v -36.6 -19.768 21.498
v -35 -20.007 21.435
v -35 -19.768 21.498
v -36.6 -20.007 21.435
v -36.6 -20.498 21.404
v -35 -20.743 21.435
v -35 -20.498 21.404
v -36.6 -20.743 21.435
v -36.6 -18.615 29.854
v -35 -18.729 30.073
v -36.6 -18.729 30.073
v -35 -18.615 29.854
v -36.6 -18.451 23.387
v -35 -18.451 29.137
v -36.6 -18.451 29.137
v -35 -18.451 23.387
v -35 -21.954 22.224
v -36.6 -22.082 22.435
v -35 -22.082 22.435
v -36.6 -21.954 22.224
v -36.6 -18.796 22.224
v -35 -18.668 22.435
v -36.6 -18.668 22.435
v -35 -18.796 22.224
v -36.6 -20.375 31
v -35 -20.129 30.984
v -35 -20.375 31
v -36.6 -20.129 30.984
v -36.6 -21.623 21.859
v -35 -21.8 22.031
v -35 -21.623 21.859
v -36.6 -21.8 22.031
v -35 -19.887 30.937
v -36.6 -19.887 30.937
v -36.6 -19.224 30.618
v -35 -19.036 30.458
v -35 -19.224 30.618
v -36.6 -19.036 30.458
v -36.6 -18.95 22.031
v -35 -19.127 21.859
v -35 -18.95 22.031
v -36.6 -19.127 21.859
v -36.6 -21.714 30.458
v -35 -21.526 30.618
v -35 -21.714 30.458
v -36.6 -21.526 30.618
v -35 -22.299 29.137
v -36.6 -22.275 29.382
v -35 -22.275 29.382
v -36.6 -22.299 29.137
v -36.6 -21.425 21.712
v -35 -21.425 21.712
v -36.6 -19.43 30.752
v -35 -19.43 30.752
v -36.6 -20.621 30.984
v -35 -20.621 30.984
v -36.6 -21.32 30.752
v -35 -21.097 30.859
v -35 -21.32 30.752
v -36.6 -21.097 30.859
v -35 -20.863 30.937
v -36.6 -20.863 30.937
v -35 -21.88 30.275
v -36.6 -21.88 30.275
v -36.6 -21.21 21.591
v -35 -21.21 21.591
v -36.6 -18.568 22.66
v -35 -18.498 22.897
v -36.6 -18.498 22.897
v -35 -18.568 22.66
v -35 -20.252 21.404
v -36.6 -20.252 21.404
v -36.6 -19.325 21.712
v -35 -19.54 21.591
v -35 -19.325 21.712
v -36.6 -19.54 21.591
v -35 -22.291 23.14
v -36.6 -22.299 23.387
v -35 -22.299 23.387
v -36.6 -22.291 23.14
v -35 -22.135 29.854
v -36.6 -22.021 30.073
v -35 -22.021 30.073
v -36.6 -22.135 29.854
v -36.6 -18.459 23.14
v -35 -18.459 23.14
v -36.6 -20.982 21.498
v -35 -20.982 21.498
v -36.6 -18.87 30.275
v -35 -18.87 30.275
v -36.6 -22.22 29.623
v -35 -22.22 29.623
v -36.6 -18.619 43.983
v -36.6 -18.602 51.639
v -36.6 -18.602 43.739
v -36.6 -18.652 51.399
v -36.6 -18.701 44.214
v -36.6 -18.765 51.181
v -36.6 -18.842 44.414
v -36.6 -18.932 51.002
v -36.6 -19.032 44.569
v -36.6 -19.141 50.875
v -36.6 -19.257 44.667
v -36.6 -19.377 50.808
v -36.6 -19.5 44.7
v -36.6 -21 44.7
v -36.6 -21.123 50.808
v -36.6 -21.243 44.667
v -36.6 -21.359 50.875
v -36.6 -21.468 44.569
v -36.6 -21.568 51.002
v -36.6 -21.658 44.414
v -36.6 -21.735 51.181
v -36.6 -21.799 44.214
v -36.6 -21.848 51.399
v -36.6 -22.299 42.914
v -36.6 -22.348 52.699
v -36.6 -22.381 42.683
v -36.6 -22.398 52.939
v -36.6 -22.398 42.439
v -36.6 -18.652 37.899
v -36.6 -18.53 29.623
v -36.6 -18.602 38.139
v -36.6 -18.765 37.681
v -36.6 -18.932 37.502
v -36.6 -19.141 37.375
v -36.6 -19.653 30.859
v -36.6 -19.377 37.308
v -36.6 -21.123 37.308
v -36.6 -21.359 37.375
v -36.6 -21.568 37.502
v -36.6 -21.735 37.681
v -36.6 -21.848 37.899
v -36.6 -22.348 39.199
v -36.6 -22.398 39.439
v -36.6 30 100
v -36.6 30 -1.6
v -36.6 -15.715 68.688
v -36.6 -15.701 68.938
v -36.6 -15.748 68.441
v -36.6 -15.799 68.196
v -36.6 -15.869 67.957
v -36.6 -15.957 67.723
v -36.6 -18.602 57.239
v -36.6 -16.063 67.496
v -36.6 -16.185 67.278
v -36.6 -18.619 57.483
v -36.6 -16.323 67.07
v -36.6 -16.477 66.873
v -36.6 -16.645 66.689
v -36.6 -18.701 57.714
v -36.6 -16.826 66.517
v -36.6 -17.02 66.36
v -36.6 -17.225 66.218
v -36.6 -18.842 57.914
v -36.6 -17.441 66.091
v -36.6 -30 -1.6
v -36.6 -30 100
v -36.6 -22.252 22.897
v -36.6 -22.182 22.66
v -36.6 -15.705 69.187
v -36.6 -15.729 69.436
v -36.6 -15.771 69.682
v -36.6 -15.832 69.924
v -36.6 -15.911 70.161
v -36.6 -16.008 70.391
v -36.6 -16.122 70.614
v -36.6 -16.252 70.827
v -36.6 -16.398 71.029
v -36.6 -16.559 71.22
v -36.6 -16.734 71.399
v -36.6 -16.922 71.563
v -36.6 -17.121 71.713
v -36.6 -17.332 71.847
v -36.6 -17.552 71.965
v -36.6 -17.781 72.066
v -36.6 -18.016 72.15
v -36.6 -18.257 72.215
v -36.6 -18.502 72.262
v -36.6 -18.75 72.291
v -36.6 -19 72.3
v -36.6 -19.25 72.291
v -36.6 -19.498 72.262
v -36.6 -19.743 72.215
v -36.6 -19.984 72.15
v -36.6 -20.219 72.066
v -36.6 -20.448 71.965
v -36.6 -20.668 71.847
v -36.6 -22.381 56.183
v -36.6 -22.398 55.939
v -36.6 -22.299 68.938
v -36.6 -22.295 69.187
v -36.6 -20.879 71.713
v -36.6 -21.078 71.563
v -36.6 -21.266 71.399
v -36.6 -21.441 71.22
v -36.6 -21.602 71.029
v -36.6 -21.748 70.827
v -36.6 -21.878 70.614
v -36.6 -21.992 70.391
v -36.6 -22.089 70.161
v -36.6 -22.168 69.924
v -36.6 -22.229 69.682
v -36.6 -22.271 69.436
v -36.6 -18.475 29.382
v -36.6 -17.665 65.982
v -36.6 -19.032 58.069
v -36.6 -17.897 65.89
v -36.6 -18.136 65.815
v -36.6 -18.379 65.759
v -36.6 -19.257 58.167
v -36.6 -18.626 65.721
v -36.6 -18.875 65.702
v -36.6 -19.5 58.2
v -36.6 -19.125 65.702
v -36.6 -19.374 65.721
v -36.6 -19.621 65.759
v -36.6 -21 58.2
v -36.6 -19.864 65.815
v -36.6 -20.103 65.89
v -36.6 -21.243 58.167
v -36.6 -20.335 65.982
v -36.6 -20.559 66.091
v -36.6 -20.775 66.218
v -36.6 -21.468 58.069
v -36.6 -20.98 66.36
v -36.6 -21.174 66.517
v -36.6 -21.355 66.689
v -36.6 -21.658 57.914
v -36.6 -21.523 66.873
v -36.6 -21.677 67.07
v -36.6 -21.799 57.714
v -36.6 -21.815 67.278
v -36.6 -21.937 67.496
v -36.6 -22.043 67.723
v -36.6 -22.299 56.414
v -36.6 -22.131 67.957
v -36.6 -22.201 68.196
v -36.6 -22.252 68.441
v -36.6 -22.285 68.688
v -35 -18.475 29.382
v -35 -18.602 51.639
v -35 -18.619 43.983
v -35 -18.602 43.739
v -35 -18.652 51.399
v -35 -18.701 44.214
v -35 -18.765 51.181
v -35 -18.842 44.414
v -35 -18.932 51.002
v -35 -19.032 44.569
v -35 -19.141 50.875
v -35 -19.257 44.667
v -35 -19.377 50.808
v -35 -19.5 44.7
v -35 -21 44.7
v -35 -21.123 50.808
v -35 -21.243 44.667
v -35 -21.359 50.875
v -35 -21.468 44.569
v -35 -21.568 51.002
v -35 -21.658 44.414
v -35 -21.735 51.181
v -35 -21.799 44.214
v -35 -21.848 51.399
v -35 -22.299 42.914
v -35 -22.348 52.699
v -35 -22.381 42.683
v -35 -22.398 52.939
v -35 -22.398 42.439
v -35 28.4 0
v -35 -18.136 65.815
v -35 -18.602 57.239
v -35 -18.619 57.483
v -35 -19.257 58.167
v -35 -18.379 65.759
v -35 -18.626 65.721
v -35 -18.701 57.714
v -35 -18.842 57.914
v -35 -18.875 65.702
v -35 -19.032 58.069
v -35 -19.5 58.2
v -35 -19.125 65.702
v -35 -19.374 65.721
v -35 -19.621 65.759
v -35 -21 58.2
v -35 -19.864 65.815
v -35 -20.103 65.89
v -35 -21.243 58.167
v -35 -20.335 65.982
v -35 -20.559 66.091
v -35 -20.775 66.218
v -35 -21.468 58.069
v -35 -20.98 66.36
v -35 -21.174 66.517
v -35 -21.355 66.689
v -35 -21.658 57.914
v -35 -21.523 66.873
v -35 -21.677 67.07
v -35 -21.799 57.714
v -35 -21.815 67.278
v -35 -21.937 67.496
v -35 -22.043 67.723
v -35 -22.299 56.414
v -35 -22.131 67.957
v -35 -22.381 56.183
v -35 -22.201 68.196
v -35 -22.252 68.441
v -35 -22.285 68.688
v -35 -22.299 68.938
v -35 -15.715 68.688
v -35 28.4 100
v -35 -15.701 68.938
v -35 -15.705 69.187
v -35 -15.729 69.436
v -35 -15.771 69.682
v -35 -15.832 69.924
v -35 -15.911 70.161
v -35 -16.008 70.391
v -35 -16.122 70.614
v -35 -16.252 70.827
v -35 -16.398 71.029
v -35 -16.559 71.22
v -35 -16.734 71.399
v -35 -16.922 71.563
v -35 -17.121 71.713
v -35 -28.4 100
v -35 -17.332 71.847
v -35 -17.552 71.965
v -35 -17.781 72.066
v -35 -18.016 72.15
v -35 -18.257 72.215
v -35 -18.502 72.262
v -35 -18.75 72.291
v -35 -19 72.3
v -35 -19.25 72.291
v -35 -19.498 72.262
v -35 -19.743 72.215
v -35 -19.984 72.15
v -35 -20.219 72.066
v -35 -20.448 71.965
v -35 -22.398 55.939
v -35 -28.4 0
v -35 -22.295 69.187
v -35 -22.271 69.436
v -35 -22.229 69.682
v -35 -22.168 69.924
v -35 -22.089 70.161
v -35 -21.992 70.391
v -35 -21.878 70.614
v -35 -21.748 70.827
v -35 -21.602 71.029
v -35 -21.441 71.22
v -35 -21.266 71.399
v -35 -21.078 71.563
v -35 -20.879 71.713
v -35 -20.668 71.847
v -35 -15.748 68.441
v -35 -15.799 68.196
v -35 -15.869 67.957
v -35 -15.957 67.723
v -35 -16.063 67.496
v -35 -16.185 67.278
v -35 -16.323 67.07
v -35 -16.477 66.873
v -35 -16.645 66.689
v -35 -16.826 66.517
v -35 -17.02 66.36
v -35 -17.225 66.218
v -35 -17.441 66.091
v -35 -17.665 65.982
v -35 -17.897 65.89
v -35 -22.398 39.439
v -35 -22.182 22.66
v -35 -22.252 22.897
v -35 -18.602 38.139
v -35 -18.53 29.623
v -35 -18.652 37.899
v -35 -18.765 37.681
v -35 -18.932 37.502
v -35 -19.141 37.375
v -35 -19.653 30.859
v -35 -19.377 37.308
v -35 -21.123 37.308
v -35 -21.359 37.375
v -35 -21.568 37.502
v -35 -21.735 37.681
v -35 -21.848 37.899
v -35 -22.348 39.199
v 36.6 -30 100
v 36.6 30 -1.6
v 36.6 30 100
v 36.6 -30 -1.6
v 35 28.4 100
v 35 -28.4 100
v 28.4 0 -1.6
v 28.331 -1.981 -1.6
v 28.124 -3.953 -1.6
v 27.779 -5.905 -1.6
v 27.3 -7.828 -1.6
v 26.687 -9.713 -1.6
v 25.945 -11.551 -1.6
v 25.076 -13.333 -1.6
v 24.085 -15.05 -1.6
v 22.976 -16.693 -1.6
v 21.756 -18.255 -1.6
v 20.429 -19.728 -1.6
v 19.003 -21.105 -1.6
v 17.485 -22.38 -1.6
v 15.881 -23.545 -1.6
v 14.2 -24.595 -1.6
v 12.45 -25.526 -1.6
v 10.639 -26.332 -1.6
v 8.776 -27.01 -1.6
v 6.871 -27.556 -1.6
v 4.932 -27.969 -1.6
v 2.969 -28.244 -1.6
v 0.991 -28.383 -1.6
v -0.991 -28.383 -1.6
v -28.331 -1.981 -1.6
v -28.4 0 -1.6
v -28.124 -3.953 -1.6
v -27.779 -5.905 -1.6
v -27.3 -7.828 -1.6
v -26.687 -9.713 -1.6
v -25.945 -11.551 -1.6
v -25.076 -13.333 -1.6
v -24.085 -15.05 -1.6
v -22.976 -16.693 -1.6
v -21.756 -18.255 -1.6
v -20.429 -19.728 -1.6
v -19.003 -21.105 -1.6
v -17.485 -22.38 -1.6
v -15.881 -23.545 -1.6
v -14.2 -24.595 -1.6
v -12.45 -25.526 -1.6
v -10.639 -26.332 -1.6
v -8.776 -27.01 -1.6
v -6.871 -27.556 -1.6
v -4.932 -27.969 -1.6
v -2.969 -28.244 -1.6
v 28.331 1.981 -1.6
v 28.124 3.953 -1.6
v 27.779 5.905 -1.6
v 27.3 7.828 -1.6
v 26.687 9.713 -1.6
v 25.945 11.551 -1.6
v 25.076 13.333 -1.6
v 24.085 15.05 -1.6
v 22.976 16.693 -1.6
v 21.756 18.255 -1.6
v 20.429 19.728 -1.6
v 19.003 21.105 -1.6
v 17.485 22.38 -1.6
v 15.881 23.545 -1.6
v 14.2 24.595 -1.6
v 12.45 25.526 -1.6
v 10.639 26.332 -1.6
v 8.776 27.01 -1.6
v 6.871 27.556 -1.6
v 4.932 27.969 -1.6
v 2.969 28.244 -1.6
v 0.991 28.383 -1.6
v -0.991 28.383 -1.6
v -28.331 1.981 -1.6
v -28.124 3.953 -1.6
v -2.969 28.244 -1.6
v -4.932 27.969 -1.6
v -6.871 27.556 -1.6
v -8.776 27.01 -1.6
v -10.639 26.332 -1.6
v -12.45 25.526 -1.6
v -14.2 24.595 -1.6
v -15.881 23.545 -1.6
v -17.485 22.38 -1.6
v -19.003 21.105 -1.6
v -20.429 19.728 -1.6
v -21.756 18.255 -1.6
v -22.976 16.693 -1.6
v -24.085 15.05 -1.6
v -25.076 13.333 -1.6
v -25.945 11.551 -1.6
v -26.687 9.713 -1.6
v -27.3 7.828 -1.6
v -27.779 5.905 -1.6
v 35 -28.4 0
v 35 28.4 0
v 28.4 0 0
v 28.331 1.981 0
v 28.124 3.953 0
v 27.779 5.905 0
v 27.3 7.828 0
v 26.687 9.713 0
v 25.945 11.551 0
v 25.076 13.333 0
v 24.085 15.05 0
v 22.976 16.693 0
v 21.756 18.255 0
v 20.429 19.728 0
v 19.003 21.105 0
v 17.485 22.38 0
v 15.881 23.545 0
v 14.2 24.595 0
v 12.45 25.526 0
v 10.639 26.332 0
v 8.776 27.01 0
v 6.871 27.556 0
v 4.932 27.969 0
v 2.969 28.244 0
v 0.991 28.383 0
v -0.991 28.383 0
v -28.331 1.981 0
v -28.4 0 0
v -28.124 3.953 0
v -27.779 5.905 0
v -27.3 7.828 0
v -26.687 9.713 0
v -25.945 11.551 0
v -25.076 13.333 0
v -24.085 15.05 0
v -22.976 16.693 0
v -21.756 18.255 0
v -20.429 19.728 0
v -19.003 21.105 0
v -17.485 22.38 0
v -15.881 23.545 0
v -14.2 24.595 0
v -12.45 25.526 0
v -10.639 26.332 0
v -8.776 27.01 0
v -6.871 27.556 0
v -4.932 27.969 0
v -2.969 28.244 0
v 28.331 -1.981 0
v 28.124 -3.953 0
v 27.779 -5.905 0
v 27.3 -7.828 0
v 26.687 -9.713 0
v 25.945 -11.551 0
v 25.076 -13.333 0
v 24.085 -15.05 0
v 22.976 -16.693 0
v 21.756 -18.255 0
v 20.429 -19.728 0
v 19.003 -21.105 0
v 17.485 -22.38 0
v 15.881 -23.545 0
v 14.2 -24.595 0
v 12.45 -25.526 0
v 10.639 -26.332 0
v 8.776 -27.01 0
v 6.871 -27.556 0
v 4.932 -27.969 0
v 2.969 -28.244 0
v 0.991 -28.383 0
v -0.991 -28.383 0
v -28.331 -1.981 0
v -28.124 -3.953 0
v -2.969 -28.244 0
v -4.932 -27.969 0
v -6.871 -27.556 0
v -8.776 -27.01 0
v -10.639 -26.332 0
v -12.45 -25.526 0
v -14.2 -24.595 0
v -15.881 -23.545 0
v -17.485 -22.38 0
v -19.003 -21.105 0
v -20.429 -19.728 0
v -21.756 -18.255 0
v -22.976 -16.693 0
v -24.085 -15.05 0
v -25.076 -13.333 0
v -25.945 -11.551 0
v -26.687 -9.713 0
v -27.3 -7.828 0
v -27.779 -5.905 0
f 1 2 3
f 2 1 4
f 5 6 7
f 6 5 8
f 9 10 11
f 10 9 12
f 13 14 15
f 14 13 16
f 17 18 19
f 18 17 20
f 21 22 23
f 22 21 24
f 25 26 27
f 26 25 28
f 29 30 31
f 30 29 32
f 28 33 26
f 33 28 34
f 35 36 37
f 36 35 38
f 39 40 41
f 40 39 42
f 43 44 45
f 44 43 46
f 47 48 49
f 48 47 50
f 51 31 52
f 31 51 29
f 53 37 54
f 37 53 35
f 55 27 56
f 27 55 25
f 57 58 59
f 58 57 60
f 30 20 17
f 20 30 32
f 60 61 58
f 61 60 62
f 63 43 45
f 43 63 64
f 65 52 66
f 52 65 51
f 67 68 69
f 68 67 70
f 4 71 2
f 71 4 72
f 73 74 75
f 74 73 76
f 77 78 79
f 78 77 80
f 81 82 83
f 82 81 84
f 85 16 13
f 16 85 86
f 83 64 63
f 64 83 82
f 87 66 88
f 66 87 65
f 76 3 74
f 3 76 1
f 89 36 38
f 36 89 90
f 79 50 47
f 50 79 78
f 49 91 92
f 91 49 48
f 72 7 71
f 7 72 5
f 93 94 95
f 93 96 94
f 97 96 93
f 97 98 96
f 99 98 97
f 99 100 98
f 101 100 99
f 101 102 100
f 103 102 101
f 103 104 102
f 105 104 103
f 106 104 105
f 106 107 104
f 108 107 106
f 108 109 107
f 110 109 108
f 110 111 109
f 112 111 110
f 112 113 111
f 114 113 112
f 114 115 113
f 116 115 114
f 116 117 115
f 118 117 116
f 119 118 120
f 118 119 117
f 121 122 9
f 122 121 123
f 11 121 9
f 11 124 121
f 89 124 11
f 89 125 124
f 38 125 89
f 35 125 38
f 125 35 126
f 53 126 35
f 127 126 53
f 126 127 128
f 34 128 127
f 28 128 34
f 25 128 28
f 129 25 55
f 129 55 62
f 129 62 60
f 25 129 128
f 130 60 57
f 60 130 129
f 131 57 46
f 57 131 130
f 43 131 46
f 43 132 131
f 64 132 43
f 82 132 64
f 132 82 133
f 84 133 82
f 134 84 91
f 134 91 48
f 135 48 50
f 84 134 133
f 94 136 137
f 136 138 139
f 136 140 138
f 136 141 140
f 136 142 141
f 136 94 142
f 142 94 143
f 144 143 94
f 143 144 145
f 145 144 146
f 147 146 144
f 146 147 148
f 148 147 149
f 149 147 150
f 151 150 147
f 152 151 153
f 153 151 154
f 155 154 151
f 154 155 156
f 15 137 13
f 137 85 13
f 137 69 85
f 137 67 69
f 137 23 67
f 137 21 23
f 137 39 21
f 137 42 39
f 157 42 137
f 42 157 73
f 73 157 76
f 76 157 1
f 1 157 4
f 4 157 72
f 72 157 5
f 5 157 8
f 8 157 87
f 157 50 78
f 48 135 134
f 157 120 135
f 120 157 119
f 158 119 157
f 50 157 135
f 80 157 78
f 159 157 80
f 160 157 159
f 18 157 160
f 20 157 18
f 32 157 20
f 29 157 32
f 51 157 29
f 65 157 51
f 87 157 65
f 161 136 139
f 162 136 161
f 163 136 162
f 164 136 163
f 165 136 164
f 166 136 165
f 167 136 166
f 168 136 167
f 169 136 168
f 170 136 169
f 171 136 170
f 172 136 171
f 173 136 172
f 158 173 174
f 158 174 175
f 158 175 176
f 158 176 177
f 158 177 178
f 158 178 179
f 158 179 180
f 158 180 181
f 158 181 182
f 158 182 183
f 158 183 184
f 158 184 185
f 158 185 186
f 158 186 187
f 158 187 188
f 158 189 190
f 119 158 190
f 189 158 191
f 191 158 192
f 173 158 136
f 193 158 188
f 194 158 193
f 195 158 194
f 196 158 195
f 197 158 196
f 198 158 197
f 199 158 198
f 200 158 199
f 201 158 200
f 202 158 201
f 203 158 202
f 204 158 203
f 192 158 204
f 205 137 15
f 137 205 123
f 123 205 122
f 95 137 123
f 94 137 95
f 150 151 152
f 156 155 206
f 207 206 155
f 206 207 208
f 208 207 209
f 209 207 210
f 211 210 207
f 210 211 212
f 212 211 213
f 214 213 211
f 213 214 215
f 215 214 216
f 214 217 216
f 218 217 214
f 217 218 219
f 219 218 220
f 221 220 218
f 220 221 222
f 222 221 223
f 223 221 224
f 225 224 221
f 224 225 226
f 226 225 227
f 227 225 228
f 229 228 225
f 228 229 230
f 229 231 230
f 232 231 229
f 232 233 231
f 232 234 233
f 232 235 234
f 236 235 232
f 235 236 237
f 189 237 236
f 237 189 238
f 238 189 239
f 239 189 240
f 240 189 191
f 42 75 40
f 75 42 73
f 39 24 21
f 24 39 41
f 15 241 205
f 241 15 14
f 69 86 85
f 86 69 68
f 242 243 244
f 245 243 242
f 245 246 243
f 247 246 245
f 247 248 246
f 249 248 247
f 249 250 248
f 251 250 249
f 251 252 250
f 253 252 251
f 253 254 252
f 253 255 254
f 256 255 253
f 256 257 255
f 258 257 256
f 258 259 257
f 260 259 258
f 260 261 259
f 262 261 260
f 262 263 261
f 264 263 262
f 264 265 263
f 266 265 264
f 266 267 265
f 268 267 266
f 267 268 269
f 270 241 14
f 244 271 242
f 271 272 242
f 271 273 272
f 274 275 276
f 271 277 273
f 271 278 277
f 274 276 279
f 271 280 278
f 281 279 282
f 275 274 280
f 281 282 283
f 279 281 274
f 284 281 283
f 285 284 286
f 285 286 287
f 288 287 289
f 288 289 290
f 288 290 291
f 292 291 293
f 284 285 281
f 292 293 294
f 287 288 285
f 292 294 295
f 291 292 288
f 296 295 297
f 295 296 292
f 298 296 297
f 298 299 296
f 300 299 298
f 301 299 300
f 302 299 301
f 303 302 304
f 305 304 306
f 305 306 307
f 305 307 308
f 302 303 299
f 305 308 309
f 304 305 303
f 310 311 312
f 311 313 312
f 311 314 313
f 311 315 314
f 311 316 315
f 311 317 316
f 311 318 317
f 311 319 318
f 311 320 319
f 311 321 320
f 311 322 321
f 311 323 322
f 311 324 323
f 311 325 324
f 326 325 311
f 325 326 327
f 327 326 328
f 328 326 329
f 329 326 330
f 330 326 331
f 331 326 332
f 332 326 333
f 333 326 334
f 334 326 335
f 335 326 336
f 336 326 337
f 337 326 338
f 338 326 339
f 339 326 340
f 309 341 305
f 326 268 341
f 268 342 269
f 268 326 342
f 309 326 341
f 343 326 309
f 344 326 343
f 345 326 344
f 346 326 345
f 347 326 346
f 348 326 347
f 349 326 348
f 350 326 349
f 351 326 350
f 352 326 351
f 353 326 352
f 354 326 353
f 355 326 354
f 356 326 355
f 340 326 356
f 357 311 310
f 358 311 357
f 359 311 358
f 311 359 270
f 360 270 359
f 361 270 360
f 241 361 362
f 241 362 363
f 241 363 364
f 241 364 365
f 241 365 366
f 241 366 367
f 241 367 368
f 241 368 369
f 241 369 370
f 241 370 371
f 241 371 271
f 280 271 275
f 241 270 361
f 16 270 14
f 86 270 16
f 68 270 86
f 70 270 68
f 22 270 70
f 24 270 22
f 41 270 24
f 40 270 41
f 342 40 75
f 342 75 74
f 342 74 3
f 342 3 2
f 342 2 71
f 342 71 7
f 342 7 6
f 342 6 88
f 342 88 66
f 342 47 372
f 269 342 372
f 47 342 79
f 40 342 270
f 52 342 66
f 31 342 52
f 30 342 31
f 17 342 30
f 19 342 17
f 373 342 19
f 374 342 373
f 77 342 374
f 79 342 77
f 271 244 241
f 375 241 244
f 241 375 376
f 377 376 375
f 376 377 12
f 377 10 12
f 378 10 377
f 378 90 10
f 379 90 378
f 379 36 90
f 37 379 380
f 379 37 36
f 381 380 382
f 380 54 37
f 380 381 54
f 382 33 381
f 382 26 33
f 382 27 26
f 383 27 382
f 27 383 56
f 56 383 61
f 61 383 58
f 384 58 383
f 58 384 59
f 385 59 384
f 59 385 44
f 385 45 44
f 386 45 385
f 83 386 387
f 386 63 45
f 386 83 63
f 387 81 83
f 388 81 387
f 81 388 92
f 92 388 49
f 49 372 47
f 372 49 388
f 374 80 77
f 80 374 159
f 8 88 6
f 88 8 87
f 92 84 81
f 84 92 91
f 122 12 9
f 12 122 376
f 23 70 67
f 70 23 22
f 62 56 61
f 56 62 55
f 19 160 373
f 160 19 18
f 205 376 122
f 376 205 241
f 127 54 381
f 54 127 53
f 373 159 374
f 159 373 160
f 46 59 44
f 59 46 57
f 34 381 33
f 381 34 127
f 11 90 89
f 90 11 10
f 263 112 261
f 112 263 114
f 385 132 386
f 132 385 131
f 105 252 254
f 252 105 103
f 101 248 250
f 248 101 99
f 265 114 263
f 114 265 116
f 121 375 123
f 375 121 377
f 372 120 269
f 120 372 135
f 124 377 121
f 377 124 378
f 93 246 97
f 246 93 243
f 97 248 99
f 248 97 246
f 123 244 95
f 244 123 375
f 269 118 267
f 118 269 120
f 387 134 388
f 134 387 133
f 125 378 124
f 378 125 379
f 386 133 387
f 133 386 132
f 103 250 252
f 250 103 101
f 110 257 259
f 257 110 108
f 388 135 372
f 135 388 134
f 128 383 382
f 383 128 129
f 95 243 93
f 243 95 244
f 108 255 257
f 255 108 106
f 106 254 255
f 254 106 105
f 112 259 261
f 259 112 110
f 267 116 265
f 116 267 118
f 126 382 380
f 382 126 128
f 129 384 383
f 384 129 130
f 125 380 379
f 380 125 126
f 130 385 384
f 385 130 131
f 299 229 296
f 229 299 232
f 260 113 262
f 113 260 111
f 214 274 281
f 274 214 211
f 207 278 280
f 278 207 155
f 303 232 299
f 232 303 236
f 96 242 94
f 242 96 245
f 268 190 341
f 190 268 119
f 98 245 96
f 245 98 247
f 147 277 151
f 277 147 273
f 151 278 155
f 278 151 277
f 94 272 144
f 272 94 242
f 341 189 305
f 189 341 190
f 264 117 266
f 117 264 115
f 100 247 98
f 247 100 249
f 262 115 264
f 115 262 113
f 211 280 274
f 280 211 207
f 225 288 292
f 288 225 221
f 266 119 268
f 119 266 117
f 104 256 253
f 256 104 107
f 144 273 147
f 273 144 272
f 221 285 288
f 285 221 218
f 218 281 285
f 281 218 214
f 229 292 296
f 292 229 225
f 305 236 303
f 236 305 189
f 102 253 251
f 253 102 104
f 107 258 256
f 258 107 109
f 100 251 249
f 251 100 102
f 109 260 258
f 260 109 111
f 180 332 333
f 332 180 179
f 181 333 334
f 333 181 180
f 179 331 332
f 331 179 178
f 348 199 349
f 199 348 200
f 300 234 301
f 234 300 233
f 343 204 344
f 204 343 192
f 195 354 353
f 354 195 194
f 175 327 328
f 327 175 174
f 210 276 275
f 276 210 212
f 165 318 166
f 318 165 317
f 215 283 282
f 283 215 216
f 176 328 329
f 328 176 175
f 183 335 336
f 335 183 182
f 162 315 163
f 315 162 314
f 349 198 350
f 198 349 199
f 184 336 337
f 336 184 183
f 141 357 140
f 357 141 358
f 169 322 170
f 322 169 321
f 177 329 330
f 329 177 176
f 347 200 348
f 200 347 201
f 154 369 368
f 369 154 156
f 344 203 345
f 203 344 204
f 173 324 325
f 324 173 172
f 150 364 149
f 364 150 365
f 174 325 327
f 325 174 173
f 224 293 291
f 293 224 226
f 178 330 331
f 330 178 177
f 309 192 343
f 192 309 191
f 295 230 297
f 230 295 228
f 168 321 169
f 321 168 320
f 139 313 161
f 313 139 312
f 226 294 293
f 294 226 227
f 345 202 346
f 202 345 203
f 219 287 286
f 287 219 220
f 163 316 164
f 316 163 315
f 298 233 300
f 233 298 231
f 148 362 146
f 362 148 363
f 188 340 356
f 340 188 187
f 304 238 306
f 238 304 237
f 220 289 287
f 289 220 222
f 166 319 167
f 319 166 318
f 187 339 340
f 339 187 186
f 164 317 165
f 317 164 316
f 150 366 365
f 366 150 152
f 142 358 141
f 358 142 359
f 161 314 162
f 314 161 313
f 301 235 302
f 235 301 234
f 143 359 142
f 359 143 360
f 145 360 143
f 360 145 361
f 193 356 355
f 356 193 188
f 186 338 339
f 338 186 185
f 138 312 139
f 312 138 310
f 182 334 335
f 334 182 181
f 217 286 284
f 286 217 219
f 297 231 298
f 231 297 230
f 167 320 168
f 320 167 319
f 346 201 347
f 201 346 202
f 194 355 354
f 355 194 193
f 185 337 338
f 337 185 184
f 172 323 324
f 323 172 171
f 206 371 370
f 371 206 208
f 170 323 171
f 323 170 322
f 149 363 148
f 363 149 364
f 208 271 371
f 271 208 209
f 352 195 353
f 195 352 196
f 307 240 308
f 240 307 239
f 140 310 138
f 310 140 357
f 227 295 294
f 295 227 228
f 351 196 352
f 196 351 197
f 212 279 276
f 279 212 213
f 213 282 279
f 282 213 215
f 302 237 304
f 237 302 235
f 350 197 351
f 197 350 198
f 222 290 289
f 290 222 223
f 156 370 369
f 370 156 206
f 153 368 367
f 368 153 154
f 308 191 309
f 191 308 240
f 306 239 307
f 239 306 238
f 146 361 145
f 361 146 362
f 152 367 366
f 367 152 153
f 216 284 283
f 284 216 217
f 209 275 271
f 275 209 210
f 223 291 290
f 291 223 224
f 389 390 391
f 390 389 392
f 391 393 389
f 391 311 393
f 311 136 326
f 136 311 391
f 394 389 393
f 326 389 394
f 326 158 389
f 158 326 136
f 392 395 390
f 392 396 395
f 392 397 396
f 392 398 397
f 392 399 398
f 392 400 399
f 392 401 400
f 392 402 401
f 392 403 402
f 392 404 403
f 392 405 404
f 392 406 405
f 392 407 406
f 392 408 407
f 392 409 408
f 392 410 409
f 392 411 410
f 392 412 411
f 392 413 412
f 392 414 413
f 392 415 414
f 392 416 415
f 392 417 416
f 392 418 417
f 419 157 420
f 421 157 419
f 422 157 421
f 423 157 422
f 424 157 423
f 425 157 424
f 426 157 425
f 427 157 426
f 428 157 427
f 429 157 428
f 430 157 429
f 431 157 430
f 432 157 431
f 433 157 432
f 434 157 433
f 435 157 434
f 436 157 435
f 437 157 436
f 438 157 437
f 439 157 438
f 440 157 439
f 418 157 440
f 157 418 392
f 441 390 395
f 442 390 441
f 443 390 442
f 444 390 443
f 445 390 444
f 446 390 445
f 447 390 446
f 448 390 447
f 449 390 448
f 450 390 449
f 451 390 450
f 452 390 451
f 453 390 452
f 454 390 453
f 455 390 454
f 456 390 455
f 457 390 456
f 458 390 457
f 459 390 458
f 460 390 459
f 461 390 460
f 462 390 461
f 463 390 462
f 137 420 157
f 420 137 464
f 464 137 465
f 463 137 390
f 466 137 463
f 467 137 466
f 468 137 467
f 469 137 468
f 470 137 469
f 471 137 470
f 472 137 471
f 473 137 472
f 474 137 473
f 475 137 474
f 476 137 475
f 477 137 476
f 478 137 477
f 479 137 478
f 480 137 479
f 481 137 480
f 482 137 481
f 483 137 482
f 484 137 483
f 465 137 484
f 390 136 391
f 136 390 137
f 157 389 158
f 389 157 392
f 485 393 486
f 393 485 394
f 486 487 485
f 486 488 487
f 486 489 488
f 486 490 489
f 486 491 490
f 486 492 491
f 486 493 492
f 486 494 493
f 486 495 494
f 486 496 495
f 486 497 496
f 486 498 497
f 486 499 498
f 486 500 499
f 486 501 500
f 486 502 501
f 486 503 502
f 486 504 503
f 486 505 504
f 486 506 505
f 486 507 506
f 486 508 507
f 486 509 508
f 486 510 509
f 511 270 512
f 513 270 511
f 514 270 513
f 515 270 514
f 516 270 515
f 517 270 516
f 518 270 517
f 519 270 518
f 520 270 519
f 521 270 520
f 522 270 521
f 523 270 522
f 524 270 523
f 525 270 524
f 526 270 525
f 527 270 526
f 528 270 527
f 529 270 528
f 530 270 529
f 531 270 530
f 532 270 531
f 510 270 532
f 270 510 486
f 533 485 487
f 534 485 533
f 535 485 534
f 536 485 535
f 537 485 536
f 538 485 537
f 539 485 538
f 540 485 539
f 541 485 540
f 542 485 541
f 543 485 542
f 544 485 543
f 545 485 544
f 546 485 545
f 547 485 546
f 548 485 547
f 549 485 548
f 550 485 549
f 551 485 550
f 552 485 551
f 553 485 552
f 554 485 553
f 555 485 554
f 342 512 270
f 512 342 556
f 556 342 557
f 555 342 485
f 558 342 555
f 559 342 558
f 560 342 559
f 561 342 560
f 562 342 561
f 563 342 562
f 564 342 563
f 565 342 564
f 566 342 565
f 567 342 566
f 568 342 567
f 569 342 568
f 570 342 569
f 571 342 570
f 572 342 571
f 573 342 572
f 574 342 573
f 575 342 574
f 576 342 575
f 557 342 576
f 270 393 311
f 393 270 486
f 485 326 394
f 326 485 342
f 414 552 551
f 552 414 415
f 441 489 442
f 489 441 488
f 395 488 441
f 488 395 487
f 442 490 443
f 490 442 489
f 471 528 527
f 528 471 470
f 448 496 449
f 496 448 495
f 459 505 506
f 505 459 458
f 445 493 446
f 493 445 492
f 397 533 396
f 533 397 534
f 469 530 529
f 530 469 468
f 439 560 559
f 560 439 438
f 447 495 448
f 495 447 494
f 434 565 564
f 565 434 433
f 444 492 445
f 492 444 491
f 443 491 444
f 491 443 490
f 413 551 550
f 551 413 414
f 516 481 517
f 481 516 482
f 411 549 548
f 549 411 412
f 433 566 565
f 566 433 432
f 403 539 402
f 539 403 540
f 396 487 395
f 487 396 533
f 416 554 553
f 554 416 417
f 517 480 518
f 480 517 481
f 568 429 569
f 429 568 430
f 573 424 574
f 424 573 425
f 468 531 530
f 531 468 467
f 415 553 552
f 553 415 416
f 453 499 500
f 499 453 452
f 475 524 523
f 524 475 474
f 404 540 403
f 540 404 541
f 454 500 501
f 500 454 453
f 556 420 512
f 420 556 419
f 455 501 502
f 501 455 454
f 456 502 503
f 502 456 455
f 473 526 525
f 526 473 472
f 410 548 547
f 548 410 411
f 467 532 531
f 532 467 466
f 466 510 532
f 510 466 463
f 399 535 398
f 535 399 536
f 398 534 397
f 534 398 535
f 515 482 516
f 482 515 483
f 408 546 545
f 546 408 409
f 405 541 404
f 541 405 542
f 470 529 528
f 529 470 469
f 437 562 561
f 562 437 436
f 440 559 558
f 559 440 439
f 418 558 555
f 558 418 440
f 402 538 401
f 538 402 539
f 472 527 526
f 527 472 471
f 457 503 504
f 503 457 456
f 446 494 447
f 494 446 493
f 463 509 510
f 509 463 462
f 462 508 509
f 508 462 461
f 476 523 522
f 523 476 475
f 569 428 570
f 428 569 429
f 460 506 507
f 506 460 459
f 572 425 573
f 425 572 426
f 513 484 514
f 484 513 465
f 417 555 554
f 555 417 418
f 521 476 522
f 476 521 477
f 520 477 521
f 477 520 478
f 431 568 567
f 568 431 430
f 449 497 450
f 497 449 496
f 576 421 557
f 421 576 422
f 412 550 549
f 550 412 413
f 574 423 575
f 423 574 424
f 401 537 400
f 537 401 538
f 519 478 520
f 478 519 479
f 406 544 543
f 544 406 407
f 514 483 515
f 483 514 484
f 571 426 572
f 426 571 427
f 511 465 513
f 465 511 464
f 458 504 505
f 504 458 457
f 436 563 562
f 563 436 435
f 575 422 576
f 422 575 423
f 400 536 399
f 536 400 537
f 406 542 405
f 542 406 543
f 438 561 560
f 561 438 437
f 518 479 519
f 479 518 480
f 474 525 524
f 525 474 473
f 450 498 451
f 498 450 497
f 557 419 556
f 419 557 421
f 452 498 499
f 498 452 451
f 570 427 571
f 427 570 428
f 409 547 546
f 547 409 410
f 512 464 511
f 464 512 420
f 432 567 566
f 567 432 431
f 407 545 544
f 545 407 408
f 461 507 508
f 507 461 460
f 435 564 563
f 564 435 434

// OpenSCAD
// file: ports.scad
module USBC(offset, wall)
{
    radius = (3.25 / 2);

    r = radius + offset;

    width = 9;

    offcenter = width / 2 - radius;

    translate([ 0, radius, 0 ]) hull()
    {
        translate([ offcenter, 0, 0 ]) cylinder(h = wall, r = r, center = true);

        translate([ -offcenter, 0, 0 ])
            cylinder(h = wall, r = r, center = true);
    }
}

module HDMIMicro(offset, wall)
{
    // needs mor offset because of clamps
    offset = offset + 0.1;

    radius = 0.5;

    r = radius + offset;

    height1 = 3.0;

    h1 = height1 - radius * 2;

    width1 = 6.6;
    w1 = width1 / 2 - radius;

    width2 = 4;
    w2 = width2 / 2 - radius;

    translate([ 0, radius, 0 ]) hull()
    {

        translate([ w1, h1, 0 ]) cylinder(h = wall, r = r, center = true);
        translate([ -w1, h1, 0 ]) cylinder(h = wall, r = r, center = true);

        translate([ w1, h1 / 4, 0 ]) cylinder(h = wall, r = r, center = true);
        translate([ -w1, h1 / 4, 0 ]) cylinder(h = wall, r = r, center = true);

        translate([ w2, 0, 0 ]) cylinder(h = wall, r = r, center = true);
        translate([ -w2, 0, 0 ]) cylinder(h = wall, r = r, center = true);
    }
}

module Klinke(offset, wall)
{
    radius = (6 / 2);
    r = radius + offset;

    translate([ 0, radius, 0 ]) cylinder(h = wall, r = r, center = true);
}

// zero is bottom center of usb port
module Ports(wall, offset)
{
    translate([ 0, 0, wall / 2 ]) USBC(offset = offset, wall = wall);
    translate([ 14.8, 0, wall / 2 ]) HDMIMicro(offset = offset, wall = wall);
    translate([ 14.8 + 13.5, 0, wall / 2 ])
        HDMIMicro(offset = offset, wall = wall);
    translate([ 14.8 + 13.5 + 14.5, 0, wall / 2 ])
        Klinke(offset = offset, wall = wall);
}
// main file
use <ports.scad>

$fa = 4;
$fs = 0.25;

wall = 4 * 0.4;

// offset for bigger port holes
offset = 0.3;

raspi = [ 85, 56, 1.4 ];

raspi_mount = 5;

fan = 60;
fan_radius = fan / 2 - wall;

inner_cube = [ 70, fan - wall * 2, 100 ];
outer_cube = [ inner_cube[0] + wall * 2, fan, inner_cube[2] + wall ];

difference()
{
    // outer
    translate([ 0, 0, outer_cube[2] / 2 - wall ])
        cube(size = outer_cube, center = true);

    // innner
    translate([ 0, 0, inner_cube[2] / 2 ])
        cube(size = inner_cube, center = true);

    // fan hole
    translate([ 0, 0, -wall / 2 ])
        cylinder(h = wall, r = fan_radius, center = true);

    // port hole
    translate([
        -inner_cube[0] / 2,
        -inner_cube[1] / 2 + raspi[2] + raspi_mount,
        100 - raspi[0] + 3.5 + 7.7
    ]) rotate([ 0, -90, 0 ]) Ports(wall = wall, offset = offset);
}
